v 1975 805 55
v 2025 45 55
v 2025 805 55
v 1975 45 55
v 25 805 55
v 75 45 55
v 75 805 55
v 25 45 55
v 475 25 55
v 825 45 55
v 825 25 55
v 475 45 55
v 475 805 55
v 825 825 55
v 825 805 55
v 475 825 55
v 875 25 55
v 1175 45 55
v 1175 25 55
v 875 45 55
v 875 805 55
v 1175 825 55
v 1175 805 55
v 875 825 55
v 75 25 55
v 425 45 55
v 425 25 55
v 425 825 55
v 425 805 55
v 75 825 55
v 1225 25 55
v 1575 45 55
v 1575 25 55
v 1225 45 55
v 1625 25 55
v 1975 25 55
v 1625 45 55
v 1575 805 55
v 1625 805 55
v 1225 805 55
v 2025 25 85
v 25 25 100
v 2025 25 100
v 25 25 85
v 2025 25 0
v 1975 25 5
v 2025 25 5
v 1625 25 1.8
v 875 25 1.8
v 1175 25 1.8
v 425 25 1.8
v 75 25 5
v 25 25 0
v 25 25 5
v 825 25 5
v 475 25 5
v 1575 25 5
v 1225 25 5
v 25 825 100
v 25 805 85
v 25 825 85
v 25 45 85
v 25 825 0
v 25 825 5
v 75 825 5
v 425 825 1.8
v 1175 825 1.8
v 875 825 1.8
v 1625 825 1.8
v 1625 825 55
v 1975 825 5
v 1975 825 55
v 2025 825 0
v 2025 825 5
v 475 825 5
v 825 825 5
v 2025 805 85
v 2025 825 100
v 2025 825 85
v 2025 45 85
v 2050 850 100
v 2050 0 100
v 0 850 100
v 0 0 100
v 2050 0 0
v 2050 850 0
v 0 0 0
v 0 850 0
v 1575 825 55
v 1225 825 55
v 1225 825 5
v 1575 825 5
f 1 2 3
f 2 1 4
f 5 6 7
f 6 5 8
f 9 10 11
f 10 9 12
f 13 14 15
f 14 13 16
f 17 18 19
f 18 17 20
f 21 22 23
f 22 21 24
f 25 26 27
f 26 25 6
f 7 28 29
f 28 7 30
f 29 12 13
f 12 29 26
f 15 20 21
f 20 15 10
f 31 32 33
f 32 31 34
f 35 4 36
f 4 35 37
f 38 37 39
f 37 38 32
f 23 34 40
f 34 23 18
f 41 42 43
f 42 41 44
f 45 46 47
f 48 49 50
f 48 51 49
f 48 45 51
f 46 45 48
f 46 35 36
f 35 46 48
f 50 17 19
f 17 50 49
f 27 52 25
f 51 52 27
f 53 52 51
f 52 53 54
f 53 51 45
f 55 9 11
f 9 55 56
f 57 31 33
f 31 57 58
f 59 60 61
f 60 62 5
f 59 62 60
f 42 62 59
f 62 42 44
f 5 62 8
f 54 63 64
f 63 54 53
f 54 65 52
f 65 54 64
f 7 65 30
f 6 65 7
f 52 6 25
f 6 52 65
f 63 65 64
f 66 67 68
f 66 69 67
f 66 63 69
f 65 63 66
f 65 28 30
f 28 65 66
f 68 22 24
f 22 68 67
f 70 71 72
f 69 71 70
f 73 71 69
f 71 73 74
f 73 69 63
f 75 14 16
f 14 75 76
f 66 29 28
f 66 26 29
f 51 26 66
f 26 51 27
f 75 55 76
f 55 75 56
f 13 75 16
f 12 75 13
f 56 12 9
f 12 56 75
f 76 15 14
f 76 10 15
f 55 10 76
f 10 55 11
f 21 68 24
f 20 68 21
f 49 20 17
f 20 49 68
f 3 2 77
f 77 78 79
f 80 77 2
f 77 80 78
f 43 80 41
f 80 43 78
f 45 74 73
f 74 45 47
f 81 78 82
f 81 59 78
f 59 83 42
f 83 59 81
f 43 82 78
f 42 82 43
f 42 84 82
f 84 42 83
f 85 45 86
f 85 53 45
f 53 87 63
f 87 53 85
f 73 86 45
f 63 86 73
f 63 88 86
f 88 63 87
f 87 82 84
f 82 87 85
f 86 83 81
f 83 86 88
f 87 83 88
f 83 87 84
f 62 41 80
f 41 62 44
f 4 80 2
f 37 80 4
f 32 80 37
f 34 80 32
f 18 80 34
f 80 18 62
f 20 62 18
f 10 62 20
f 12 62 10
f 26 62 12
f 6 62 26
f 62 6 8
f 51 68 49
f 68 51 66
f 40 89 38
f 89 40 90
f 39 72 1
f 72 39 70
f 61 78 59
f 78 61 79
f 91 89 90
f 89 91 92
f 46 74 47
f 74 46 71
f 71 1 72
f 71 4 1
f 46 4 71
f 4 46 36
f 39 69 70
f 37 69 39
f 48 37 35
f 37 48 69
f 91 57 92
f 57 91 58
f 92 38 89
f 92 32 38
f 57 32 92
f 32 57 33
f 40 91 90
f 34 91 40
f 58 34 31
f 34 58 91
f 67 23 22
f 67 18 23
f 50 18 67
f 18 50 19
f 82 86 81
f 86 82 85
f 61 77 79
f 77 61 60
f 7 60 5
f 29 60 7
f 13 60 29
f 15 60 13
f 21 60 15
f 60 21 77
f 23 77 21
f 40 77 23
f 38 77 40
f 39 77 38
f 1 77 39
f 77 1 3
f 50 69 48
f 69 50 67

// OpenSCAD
// My dictionary of this project
	// length (or Y-axis size) = L;
	// width (or X-axis size) = W;
	// hight (or Z-axis size) = H;

	// X-axis shift = dX (from windom to door);
	// Y-axis shift = dY (view the window from right to left);
	// Z-axis shift = dZ (from floor to ceiling);

	// color = clr;

	// side part =
	//			SPi for inner;
	//			SPo for outer;
	//			SPt for transverse;
	// plywood = PW; Bad = BD;
	
//====================================================
// draw outer side part

SPo_clr = "yellow";
SPo_W = 25;
SPo_H = 100;
SPo_L = 2000;

module SPo_draw(length){
	color(SPo_clr, 1)
	cube([length, SPo_W, SPo_H]);
}
module SPo_draw_green(length){
	color("green", 1)
	cube([length, SPo_W, SPo_H]);
}

//====================================================
// draw inner side part

SPi_clr = "orange";
SPi_W = 20;
SPi_H = 30;
SPi_L = SPo_L;

module SPi_draw(length){
	color(SPi_clr, 1)
	cube([length, SPi_W, SPi_H]);
}

//====================================================
// draw transverse side part

SPt_clr = "brown";
SPt_W = 50;
SPt_H = 50;
SPt_L = 800;


module SPt_draw(length){
	color(SPt_clr, 1)
	cube([length, SPt_W, SPt_H]);
}


//====================================================
// draw one plywood

PW_clr = "red";
PW_H = 3.2;
PW_W = 800;
PW_L = 450;

module PW_draw(length, width){
	color(PW_clr, 1)
	cube([length, width, PW_H]);
}

//====================================================
// draw bad

// draw 1/2 frame
module piece_1_BD_draw(){

l1 = SPo_L;
l2 = SPt_L + 2 * SPo_W;
l2_1 = SPt_L;
l3 = SPi_L;

// draw outer detail
translate([SPo_W, 0, 0])
	SPo_draw(l1);
// draw transverse outer detail
translate([SPo_W, 0, 0])
	rotate([0, 0, 90])
		SPo_draw_green(l2);

// draw inner detail
translate([SPo_W, SPo_W, SPo_H - SPi_H - 15])
	SPi_draw(l3);

// draw transverse details
for (i=[0:2]){
translate([SPt_W + SPo_W + i * 400, SPo_W, 5])
	rotate([0, 0, 90])
		SPt_draw(l2_1);
}

// draw 1/2 plywood
x = PW_L;
y = PW_W;
translate([SPo_W + 400, SPo_W, 5 - PW_H])
	PW_draw(x, y);
}

//====================================================
//
piece_1_BD_draw();
translate([2000 + 2 * SPo_W, 800 + 2 * SPo_W, 0])
	rotate([0,0,180])
		piece_1_BD_draw();

echo("outer x2", SPo_H, SPo_W, SPo_L);
echo("outer x2", SPo_H, SPo_W, SPt_L + 2 * SPo_W);
echo("inner x2", SPi_H, SPi_W, SPo_L);
echo("transverse x6", SPt_H, SPt_W, SPt_L);
echo("plywood x2", PW_H, PW_W, PW_L);
